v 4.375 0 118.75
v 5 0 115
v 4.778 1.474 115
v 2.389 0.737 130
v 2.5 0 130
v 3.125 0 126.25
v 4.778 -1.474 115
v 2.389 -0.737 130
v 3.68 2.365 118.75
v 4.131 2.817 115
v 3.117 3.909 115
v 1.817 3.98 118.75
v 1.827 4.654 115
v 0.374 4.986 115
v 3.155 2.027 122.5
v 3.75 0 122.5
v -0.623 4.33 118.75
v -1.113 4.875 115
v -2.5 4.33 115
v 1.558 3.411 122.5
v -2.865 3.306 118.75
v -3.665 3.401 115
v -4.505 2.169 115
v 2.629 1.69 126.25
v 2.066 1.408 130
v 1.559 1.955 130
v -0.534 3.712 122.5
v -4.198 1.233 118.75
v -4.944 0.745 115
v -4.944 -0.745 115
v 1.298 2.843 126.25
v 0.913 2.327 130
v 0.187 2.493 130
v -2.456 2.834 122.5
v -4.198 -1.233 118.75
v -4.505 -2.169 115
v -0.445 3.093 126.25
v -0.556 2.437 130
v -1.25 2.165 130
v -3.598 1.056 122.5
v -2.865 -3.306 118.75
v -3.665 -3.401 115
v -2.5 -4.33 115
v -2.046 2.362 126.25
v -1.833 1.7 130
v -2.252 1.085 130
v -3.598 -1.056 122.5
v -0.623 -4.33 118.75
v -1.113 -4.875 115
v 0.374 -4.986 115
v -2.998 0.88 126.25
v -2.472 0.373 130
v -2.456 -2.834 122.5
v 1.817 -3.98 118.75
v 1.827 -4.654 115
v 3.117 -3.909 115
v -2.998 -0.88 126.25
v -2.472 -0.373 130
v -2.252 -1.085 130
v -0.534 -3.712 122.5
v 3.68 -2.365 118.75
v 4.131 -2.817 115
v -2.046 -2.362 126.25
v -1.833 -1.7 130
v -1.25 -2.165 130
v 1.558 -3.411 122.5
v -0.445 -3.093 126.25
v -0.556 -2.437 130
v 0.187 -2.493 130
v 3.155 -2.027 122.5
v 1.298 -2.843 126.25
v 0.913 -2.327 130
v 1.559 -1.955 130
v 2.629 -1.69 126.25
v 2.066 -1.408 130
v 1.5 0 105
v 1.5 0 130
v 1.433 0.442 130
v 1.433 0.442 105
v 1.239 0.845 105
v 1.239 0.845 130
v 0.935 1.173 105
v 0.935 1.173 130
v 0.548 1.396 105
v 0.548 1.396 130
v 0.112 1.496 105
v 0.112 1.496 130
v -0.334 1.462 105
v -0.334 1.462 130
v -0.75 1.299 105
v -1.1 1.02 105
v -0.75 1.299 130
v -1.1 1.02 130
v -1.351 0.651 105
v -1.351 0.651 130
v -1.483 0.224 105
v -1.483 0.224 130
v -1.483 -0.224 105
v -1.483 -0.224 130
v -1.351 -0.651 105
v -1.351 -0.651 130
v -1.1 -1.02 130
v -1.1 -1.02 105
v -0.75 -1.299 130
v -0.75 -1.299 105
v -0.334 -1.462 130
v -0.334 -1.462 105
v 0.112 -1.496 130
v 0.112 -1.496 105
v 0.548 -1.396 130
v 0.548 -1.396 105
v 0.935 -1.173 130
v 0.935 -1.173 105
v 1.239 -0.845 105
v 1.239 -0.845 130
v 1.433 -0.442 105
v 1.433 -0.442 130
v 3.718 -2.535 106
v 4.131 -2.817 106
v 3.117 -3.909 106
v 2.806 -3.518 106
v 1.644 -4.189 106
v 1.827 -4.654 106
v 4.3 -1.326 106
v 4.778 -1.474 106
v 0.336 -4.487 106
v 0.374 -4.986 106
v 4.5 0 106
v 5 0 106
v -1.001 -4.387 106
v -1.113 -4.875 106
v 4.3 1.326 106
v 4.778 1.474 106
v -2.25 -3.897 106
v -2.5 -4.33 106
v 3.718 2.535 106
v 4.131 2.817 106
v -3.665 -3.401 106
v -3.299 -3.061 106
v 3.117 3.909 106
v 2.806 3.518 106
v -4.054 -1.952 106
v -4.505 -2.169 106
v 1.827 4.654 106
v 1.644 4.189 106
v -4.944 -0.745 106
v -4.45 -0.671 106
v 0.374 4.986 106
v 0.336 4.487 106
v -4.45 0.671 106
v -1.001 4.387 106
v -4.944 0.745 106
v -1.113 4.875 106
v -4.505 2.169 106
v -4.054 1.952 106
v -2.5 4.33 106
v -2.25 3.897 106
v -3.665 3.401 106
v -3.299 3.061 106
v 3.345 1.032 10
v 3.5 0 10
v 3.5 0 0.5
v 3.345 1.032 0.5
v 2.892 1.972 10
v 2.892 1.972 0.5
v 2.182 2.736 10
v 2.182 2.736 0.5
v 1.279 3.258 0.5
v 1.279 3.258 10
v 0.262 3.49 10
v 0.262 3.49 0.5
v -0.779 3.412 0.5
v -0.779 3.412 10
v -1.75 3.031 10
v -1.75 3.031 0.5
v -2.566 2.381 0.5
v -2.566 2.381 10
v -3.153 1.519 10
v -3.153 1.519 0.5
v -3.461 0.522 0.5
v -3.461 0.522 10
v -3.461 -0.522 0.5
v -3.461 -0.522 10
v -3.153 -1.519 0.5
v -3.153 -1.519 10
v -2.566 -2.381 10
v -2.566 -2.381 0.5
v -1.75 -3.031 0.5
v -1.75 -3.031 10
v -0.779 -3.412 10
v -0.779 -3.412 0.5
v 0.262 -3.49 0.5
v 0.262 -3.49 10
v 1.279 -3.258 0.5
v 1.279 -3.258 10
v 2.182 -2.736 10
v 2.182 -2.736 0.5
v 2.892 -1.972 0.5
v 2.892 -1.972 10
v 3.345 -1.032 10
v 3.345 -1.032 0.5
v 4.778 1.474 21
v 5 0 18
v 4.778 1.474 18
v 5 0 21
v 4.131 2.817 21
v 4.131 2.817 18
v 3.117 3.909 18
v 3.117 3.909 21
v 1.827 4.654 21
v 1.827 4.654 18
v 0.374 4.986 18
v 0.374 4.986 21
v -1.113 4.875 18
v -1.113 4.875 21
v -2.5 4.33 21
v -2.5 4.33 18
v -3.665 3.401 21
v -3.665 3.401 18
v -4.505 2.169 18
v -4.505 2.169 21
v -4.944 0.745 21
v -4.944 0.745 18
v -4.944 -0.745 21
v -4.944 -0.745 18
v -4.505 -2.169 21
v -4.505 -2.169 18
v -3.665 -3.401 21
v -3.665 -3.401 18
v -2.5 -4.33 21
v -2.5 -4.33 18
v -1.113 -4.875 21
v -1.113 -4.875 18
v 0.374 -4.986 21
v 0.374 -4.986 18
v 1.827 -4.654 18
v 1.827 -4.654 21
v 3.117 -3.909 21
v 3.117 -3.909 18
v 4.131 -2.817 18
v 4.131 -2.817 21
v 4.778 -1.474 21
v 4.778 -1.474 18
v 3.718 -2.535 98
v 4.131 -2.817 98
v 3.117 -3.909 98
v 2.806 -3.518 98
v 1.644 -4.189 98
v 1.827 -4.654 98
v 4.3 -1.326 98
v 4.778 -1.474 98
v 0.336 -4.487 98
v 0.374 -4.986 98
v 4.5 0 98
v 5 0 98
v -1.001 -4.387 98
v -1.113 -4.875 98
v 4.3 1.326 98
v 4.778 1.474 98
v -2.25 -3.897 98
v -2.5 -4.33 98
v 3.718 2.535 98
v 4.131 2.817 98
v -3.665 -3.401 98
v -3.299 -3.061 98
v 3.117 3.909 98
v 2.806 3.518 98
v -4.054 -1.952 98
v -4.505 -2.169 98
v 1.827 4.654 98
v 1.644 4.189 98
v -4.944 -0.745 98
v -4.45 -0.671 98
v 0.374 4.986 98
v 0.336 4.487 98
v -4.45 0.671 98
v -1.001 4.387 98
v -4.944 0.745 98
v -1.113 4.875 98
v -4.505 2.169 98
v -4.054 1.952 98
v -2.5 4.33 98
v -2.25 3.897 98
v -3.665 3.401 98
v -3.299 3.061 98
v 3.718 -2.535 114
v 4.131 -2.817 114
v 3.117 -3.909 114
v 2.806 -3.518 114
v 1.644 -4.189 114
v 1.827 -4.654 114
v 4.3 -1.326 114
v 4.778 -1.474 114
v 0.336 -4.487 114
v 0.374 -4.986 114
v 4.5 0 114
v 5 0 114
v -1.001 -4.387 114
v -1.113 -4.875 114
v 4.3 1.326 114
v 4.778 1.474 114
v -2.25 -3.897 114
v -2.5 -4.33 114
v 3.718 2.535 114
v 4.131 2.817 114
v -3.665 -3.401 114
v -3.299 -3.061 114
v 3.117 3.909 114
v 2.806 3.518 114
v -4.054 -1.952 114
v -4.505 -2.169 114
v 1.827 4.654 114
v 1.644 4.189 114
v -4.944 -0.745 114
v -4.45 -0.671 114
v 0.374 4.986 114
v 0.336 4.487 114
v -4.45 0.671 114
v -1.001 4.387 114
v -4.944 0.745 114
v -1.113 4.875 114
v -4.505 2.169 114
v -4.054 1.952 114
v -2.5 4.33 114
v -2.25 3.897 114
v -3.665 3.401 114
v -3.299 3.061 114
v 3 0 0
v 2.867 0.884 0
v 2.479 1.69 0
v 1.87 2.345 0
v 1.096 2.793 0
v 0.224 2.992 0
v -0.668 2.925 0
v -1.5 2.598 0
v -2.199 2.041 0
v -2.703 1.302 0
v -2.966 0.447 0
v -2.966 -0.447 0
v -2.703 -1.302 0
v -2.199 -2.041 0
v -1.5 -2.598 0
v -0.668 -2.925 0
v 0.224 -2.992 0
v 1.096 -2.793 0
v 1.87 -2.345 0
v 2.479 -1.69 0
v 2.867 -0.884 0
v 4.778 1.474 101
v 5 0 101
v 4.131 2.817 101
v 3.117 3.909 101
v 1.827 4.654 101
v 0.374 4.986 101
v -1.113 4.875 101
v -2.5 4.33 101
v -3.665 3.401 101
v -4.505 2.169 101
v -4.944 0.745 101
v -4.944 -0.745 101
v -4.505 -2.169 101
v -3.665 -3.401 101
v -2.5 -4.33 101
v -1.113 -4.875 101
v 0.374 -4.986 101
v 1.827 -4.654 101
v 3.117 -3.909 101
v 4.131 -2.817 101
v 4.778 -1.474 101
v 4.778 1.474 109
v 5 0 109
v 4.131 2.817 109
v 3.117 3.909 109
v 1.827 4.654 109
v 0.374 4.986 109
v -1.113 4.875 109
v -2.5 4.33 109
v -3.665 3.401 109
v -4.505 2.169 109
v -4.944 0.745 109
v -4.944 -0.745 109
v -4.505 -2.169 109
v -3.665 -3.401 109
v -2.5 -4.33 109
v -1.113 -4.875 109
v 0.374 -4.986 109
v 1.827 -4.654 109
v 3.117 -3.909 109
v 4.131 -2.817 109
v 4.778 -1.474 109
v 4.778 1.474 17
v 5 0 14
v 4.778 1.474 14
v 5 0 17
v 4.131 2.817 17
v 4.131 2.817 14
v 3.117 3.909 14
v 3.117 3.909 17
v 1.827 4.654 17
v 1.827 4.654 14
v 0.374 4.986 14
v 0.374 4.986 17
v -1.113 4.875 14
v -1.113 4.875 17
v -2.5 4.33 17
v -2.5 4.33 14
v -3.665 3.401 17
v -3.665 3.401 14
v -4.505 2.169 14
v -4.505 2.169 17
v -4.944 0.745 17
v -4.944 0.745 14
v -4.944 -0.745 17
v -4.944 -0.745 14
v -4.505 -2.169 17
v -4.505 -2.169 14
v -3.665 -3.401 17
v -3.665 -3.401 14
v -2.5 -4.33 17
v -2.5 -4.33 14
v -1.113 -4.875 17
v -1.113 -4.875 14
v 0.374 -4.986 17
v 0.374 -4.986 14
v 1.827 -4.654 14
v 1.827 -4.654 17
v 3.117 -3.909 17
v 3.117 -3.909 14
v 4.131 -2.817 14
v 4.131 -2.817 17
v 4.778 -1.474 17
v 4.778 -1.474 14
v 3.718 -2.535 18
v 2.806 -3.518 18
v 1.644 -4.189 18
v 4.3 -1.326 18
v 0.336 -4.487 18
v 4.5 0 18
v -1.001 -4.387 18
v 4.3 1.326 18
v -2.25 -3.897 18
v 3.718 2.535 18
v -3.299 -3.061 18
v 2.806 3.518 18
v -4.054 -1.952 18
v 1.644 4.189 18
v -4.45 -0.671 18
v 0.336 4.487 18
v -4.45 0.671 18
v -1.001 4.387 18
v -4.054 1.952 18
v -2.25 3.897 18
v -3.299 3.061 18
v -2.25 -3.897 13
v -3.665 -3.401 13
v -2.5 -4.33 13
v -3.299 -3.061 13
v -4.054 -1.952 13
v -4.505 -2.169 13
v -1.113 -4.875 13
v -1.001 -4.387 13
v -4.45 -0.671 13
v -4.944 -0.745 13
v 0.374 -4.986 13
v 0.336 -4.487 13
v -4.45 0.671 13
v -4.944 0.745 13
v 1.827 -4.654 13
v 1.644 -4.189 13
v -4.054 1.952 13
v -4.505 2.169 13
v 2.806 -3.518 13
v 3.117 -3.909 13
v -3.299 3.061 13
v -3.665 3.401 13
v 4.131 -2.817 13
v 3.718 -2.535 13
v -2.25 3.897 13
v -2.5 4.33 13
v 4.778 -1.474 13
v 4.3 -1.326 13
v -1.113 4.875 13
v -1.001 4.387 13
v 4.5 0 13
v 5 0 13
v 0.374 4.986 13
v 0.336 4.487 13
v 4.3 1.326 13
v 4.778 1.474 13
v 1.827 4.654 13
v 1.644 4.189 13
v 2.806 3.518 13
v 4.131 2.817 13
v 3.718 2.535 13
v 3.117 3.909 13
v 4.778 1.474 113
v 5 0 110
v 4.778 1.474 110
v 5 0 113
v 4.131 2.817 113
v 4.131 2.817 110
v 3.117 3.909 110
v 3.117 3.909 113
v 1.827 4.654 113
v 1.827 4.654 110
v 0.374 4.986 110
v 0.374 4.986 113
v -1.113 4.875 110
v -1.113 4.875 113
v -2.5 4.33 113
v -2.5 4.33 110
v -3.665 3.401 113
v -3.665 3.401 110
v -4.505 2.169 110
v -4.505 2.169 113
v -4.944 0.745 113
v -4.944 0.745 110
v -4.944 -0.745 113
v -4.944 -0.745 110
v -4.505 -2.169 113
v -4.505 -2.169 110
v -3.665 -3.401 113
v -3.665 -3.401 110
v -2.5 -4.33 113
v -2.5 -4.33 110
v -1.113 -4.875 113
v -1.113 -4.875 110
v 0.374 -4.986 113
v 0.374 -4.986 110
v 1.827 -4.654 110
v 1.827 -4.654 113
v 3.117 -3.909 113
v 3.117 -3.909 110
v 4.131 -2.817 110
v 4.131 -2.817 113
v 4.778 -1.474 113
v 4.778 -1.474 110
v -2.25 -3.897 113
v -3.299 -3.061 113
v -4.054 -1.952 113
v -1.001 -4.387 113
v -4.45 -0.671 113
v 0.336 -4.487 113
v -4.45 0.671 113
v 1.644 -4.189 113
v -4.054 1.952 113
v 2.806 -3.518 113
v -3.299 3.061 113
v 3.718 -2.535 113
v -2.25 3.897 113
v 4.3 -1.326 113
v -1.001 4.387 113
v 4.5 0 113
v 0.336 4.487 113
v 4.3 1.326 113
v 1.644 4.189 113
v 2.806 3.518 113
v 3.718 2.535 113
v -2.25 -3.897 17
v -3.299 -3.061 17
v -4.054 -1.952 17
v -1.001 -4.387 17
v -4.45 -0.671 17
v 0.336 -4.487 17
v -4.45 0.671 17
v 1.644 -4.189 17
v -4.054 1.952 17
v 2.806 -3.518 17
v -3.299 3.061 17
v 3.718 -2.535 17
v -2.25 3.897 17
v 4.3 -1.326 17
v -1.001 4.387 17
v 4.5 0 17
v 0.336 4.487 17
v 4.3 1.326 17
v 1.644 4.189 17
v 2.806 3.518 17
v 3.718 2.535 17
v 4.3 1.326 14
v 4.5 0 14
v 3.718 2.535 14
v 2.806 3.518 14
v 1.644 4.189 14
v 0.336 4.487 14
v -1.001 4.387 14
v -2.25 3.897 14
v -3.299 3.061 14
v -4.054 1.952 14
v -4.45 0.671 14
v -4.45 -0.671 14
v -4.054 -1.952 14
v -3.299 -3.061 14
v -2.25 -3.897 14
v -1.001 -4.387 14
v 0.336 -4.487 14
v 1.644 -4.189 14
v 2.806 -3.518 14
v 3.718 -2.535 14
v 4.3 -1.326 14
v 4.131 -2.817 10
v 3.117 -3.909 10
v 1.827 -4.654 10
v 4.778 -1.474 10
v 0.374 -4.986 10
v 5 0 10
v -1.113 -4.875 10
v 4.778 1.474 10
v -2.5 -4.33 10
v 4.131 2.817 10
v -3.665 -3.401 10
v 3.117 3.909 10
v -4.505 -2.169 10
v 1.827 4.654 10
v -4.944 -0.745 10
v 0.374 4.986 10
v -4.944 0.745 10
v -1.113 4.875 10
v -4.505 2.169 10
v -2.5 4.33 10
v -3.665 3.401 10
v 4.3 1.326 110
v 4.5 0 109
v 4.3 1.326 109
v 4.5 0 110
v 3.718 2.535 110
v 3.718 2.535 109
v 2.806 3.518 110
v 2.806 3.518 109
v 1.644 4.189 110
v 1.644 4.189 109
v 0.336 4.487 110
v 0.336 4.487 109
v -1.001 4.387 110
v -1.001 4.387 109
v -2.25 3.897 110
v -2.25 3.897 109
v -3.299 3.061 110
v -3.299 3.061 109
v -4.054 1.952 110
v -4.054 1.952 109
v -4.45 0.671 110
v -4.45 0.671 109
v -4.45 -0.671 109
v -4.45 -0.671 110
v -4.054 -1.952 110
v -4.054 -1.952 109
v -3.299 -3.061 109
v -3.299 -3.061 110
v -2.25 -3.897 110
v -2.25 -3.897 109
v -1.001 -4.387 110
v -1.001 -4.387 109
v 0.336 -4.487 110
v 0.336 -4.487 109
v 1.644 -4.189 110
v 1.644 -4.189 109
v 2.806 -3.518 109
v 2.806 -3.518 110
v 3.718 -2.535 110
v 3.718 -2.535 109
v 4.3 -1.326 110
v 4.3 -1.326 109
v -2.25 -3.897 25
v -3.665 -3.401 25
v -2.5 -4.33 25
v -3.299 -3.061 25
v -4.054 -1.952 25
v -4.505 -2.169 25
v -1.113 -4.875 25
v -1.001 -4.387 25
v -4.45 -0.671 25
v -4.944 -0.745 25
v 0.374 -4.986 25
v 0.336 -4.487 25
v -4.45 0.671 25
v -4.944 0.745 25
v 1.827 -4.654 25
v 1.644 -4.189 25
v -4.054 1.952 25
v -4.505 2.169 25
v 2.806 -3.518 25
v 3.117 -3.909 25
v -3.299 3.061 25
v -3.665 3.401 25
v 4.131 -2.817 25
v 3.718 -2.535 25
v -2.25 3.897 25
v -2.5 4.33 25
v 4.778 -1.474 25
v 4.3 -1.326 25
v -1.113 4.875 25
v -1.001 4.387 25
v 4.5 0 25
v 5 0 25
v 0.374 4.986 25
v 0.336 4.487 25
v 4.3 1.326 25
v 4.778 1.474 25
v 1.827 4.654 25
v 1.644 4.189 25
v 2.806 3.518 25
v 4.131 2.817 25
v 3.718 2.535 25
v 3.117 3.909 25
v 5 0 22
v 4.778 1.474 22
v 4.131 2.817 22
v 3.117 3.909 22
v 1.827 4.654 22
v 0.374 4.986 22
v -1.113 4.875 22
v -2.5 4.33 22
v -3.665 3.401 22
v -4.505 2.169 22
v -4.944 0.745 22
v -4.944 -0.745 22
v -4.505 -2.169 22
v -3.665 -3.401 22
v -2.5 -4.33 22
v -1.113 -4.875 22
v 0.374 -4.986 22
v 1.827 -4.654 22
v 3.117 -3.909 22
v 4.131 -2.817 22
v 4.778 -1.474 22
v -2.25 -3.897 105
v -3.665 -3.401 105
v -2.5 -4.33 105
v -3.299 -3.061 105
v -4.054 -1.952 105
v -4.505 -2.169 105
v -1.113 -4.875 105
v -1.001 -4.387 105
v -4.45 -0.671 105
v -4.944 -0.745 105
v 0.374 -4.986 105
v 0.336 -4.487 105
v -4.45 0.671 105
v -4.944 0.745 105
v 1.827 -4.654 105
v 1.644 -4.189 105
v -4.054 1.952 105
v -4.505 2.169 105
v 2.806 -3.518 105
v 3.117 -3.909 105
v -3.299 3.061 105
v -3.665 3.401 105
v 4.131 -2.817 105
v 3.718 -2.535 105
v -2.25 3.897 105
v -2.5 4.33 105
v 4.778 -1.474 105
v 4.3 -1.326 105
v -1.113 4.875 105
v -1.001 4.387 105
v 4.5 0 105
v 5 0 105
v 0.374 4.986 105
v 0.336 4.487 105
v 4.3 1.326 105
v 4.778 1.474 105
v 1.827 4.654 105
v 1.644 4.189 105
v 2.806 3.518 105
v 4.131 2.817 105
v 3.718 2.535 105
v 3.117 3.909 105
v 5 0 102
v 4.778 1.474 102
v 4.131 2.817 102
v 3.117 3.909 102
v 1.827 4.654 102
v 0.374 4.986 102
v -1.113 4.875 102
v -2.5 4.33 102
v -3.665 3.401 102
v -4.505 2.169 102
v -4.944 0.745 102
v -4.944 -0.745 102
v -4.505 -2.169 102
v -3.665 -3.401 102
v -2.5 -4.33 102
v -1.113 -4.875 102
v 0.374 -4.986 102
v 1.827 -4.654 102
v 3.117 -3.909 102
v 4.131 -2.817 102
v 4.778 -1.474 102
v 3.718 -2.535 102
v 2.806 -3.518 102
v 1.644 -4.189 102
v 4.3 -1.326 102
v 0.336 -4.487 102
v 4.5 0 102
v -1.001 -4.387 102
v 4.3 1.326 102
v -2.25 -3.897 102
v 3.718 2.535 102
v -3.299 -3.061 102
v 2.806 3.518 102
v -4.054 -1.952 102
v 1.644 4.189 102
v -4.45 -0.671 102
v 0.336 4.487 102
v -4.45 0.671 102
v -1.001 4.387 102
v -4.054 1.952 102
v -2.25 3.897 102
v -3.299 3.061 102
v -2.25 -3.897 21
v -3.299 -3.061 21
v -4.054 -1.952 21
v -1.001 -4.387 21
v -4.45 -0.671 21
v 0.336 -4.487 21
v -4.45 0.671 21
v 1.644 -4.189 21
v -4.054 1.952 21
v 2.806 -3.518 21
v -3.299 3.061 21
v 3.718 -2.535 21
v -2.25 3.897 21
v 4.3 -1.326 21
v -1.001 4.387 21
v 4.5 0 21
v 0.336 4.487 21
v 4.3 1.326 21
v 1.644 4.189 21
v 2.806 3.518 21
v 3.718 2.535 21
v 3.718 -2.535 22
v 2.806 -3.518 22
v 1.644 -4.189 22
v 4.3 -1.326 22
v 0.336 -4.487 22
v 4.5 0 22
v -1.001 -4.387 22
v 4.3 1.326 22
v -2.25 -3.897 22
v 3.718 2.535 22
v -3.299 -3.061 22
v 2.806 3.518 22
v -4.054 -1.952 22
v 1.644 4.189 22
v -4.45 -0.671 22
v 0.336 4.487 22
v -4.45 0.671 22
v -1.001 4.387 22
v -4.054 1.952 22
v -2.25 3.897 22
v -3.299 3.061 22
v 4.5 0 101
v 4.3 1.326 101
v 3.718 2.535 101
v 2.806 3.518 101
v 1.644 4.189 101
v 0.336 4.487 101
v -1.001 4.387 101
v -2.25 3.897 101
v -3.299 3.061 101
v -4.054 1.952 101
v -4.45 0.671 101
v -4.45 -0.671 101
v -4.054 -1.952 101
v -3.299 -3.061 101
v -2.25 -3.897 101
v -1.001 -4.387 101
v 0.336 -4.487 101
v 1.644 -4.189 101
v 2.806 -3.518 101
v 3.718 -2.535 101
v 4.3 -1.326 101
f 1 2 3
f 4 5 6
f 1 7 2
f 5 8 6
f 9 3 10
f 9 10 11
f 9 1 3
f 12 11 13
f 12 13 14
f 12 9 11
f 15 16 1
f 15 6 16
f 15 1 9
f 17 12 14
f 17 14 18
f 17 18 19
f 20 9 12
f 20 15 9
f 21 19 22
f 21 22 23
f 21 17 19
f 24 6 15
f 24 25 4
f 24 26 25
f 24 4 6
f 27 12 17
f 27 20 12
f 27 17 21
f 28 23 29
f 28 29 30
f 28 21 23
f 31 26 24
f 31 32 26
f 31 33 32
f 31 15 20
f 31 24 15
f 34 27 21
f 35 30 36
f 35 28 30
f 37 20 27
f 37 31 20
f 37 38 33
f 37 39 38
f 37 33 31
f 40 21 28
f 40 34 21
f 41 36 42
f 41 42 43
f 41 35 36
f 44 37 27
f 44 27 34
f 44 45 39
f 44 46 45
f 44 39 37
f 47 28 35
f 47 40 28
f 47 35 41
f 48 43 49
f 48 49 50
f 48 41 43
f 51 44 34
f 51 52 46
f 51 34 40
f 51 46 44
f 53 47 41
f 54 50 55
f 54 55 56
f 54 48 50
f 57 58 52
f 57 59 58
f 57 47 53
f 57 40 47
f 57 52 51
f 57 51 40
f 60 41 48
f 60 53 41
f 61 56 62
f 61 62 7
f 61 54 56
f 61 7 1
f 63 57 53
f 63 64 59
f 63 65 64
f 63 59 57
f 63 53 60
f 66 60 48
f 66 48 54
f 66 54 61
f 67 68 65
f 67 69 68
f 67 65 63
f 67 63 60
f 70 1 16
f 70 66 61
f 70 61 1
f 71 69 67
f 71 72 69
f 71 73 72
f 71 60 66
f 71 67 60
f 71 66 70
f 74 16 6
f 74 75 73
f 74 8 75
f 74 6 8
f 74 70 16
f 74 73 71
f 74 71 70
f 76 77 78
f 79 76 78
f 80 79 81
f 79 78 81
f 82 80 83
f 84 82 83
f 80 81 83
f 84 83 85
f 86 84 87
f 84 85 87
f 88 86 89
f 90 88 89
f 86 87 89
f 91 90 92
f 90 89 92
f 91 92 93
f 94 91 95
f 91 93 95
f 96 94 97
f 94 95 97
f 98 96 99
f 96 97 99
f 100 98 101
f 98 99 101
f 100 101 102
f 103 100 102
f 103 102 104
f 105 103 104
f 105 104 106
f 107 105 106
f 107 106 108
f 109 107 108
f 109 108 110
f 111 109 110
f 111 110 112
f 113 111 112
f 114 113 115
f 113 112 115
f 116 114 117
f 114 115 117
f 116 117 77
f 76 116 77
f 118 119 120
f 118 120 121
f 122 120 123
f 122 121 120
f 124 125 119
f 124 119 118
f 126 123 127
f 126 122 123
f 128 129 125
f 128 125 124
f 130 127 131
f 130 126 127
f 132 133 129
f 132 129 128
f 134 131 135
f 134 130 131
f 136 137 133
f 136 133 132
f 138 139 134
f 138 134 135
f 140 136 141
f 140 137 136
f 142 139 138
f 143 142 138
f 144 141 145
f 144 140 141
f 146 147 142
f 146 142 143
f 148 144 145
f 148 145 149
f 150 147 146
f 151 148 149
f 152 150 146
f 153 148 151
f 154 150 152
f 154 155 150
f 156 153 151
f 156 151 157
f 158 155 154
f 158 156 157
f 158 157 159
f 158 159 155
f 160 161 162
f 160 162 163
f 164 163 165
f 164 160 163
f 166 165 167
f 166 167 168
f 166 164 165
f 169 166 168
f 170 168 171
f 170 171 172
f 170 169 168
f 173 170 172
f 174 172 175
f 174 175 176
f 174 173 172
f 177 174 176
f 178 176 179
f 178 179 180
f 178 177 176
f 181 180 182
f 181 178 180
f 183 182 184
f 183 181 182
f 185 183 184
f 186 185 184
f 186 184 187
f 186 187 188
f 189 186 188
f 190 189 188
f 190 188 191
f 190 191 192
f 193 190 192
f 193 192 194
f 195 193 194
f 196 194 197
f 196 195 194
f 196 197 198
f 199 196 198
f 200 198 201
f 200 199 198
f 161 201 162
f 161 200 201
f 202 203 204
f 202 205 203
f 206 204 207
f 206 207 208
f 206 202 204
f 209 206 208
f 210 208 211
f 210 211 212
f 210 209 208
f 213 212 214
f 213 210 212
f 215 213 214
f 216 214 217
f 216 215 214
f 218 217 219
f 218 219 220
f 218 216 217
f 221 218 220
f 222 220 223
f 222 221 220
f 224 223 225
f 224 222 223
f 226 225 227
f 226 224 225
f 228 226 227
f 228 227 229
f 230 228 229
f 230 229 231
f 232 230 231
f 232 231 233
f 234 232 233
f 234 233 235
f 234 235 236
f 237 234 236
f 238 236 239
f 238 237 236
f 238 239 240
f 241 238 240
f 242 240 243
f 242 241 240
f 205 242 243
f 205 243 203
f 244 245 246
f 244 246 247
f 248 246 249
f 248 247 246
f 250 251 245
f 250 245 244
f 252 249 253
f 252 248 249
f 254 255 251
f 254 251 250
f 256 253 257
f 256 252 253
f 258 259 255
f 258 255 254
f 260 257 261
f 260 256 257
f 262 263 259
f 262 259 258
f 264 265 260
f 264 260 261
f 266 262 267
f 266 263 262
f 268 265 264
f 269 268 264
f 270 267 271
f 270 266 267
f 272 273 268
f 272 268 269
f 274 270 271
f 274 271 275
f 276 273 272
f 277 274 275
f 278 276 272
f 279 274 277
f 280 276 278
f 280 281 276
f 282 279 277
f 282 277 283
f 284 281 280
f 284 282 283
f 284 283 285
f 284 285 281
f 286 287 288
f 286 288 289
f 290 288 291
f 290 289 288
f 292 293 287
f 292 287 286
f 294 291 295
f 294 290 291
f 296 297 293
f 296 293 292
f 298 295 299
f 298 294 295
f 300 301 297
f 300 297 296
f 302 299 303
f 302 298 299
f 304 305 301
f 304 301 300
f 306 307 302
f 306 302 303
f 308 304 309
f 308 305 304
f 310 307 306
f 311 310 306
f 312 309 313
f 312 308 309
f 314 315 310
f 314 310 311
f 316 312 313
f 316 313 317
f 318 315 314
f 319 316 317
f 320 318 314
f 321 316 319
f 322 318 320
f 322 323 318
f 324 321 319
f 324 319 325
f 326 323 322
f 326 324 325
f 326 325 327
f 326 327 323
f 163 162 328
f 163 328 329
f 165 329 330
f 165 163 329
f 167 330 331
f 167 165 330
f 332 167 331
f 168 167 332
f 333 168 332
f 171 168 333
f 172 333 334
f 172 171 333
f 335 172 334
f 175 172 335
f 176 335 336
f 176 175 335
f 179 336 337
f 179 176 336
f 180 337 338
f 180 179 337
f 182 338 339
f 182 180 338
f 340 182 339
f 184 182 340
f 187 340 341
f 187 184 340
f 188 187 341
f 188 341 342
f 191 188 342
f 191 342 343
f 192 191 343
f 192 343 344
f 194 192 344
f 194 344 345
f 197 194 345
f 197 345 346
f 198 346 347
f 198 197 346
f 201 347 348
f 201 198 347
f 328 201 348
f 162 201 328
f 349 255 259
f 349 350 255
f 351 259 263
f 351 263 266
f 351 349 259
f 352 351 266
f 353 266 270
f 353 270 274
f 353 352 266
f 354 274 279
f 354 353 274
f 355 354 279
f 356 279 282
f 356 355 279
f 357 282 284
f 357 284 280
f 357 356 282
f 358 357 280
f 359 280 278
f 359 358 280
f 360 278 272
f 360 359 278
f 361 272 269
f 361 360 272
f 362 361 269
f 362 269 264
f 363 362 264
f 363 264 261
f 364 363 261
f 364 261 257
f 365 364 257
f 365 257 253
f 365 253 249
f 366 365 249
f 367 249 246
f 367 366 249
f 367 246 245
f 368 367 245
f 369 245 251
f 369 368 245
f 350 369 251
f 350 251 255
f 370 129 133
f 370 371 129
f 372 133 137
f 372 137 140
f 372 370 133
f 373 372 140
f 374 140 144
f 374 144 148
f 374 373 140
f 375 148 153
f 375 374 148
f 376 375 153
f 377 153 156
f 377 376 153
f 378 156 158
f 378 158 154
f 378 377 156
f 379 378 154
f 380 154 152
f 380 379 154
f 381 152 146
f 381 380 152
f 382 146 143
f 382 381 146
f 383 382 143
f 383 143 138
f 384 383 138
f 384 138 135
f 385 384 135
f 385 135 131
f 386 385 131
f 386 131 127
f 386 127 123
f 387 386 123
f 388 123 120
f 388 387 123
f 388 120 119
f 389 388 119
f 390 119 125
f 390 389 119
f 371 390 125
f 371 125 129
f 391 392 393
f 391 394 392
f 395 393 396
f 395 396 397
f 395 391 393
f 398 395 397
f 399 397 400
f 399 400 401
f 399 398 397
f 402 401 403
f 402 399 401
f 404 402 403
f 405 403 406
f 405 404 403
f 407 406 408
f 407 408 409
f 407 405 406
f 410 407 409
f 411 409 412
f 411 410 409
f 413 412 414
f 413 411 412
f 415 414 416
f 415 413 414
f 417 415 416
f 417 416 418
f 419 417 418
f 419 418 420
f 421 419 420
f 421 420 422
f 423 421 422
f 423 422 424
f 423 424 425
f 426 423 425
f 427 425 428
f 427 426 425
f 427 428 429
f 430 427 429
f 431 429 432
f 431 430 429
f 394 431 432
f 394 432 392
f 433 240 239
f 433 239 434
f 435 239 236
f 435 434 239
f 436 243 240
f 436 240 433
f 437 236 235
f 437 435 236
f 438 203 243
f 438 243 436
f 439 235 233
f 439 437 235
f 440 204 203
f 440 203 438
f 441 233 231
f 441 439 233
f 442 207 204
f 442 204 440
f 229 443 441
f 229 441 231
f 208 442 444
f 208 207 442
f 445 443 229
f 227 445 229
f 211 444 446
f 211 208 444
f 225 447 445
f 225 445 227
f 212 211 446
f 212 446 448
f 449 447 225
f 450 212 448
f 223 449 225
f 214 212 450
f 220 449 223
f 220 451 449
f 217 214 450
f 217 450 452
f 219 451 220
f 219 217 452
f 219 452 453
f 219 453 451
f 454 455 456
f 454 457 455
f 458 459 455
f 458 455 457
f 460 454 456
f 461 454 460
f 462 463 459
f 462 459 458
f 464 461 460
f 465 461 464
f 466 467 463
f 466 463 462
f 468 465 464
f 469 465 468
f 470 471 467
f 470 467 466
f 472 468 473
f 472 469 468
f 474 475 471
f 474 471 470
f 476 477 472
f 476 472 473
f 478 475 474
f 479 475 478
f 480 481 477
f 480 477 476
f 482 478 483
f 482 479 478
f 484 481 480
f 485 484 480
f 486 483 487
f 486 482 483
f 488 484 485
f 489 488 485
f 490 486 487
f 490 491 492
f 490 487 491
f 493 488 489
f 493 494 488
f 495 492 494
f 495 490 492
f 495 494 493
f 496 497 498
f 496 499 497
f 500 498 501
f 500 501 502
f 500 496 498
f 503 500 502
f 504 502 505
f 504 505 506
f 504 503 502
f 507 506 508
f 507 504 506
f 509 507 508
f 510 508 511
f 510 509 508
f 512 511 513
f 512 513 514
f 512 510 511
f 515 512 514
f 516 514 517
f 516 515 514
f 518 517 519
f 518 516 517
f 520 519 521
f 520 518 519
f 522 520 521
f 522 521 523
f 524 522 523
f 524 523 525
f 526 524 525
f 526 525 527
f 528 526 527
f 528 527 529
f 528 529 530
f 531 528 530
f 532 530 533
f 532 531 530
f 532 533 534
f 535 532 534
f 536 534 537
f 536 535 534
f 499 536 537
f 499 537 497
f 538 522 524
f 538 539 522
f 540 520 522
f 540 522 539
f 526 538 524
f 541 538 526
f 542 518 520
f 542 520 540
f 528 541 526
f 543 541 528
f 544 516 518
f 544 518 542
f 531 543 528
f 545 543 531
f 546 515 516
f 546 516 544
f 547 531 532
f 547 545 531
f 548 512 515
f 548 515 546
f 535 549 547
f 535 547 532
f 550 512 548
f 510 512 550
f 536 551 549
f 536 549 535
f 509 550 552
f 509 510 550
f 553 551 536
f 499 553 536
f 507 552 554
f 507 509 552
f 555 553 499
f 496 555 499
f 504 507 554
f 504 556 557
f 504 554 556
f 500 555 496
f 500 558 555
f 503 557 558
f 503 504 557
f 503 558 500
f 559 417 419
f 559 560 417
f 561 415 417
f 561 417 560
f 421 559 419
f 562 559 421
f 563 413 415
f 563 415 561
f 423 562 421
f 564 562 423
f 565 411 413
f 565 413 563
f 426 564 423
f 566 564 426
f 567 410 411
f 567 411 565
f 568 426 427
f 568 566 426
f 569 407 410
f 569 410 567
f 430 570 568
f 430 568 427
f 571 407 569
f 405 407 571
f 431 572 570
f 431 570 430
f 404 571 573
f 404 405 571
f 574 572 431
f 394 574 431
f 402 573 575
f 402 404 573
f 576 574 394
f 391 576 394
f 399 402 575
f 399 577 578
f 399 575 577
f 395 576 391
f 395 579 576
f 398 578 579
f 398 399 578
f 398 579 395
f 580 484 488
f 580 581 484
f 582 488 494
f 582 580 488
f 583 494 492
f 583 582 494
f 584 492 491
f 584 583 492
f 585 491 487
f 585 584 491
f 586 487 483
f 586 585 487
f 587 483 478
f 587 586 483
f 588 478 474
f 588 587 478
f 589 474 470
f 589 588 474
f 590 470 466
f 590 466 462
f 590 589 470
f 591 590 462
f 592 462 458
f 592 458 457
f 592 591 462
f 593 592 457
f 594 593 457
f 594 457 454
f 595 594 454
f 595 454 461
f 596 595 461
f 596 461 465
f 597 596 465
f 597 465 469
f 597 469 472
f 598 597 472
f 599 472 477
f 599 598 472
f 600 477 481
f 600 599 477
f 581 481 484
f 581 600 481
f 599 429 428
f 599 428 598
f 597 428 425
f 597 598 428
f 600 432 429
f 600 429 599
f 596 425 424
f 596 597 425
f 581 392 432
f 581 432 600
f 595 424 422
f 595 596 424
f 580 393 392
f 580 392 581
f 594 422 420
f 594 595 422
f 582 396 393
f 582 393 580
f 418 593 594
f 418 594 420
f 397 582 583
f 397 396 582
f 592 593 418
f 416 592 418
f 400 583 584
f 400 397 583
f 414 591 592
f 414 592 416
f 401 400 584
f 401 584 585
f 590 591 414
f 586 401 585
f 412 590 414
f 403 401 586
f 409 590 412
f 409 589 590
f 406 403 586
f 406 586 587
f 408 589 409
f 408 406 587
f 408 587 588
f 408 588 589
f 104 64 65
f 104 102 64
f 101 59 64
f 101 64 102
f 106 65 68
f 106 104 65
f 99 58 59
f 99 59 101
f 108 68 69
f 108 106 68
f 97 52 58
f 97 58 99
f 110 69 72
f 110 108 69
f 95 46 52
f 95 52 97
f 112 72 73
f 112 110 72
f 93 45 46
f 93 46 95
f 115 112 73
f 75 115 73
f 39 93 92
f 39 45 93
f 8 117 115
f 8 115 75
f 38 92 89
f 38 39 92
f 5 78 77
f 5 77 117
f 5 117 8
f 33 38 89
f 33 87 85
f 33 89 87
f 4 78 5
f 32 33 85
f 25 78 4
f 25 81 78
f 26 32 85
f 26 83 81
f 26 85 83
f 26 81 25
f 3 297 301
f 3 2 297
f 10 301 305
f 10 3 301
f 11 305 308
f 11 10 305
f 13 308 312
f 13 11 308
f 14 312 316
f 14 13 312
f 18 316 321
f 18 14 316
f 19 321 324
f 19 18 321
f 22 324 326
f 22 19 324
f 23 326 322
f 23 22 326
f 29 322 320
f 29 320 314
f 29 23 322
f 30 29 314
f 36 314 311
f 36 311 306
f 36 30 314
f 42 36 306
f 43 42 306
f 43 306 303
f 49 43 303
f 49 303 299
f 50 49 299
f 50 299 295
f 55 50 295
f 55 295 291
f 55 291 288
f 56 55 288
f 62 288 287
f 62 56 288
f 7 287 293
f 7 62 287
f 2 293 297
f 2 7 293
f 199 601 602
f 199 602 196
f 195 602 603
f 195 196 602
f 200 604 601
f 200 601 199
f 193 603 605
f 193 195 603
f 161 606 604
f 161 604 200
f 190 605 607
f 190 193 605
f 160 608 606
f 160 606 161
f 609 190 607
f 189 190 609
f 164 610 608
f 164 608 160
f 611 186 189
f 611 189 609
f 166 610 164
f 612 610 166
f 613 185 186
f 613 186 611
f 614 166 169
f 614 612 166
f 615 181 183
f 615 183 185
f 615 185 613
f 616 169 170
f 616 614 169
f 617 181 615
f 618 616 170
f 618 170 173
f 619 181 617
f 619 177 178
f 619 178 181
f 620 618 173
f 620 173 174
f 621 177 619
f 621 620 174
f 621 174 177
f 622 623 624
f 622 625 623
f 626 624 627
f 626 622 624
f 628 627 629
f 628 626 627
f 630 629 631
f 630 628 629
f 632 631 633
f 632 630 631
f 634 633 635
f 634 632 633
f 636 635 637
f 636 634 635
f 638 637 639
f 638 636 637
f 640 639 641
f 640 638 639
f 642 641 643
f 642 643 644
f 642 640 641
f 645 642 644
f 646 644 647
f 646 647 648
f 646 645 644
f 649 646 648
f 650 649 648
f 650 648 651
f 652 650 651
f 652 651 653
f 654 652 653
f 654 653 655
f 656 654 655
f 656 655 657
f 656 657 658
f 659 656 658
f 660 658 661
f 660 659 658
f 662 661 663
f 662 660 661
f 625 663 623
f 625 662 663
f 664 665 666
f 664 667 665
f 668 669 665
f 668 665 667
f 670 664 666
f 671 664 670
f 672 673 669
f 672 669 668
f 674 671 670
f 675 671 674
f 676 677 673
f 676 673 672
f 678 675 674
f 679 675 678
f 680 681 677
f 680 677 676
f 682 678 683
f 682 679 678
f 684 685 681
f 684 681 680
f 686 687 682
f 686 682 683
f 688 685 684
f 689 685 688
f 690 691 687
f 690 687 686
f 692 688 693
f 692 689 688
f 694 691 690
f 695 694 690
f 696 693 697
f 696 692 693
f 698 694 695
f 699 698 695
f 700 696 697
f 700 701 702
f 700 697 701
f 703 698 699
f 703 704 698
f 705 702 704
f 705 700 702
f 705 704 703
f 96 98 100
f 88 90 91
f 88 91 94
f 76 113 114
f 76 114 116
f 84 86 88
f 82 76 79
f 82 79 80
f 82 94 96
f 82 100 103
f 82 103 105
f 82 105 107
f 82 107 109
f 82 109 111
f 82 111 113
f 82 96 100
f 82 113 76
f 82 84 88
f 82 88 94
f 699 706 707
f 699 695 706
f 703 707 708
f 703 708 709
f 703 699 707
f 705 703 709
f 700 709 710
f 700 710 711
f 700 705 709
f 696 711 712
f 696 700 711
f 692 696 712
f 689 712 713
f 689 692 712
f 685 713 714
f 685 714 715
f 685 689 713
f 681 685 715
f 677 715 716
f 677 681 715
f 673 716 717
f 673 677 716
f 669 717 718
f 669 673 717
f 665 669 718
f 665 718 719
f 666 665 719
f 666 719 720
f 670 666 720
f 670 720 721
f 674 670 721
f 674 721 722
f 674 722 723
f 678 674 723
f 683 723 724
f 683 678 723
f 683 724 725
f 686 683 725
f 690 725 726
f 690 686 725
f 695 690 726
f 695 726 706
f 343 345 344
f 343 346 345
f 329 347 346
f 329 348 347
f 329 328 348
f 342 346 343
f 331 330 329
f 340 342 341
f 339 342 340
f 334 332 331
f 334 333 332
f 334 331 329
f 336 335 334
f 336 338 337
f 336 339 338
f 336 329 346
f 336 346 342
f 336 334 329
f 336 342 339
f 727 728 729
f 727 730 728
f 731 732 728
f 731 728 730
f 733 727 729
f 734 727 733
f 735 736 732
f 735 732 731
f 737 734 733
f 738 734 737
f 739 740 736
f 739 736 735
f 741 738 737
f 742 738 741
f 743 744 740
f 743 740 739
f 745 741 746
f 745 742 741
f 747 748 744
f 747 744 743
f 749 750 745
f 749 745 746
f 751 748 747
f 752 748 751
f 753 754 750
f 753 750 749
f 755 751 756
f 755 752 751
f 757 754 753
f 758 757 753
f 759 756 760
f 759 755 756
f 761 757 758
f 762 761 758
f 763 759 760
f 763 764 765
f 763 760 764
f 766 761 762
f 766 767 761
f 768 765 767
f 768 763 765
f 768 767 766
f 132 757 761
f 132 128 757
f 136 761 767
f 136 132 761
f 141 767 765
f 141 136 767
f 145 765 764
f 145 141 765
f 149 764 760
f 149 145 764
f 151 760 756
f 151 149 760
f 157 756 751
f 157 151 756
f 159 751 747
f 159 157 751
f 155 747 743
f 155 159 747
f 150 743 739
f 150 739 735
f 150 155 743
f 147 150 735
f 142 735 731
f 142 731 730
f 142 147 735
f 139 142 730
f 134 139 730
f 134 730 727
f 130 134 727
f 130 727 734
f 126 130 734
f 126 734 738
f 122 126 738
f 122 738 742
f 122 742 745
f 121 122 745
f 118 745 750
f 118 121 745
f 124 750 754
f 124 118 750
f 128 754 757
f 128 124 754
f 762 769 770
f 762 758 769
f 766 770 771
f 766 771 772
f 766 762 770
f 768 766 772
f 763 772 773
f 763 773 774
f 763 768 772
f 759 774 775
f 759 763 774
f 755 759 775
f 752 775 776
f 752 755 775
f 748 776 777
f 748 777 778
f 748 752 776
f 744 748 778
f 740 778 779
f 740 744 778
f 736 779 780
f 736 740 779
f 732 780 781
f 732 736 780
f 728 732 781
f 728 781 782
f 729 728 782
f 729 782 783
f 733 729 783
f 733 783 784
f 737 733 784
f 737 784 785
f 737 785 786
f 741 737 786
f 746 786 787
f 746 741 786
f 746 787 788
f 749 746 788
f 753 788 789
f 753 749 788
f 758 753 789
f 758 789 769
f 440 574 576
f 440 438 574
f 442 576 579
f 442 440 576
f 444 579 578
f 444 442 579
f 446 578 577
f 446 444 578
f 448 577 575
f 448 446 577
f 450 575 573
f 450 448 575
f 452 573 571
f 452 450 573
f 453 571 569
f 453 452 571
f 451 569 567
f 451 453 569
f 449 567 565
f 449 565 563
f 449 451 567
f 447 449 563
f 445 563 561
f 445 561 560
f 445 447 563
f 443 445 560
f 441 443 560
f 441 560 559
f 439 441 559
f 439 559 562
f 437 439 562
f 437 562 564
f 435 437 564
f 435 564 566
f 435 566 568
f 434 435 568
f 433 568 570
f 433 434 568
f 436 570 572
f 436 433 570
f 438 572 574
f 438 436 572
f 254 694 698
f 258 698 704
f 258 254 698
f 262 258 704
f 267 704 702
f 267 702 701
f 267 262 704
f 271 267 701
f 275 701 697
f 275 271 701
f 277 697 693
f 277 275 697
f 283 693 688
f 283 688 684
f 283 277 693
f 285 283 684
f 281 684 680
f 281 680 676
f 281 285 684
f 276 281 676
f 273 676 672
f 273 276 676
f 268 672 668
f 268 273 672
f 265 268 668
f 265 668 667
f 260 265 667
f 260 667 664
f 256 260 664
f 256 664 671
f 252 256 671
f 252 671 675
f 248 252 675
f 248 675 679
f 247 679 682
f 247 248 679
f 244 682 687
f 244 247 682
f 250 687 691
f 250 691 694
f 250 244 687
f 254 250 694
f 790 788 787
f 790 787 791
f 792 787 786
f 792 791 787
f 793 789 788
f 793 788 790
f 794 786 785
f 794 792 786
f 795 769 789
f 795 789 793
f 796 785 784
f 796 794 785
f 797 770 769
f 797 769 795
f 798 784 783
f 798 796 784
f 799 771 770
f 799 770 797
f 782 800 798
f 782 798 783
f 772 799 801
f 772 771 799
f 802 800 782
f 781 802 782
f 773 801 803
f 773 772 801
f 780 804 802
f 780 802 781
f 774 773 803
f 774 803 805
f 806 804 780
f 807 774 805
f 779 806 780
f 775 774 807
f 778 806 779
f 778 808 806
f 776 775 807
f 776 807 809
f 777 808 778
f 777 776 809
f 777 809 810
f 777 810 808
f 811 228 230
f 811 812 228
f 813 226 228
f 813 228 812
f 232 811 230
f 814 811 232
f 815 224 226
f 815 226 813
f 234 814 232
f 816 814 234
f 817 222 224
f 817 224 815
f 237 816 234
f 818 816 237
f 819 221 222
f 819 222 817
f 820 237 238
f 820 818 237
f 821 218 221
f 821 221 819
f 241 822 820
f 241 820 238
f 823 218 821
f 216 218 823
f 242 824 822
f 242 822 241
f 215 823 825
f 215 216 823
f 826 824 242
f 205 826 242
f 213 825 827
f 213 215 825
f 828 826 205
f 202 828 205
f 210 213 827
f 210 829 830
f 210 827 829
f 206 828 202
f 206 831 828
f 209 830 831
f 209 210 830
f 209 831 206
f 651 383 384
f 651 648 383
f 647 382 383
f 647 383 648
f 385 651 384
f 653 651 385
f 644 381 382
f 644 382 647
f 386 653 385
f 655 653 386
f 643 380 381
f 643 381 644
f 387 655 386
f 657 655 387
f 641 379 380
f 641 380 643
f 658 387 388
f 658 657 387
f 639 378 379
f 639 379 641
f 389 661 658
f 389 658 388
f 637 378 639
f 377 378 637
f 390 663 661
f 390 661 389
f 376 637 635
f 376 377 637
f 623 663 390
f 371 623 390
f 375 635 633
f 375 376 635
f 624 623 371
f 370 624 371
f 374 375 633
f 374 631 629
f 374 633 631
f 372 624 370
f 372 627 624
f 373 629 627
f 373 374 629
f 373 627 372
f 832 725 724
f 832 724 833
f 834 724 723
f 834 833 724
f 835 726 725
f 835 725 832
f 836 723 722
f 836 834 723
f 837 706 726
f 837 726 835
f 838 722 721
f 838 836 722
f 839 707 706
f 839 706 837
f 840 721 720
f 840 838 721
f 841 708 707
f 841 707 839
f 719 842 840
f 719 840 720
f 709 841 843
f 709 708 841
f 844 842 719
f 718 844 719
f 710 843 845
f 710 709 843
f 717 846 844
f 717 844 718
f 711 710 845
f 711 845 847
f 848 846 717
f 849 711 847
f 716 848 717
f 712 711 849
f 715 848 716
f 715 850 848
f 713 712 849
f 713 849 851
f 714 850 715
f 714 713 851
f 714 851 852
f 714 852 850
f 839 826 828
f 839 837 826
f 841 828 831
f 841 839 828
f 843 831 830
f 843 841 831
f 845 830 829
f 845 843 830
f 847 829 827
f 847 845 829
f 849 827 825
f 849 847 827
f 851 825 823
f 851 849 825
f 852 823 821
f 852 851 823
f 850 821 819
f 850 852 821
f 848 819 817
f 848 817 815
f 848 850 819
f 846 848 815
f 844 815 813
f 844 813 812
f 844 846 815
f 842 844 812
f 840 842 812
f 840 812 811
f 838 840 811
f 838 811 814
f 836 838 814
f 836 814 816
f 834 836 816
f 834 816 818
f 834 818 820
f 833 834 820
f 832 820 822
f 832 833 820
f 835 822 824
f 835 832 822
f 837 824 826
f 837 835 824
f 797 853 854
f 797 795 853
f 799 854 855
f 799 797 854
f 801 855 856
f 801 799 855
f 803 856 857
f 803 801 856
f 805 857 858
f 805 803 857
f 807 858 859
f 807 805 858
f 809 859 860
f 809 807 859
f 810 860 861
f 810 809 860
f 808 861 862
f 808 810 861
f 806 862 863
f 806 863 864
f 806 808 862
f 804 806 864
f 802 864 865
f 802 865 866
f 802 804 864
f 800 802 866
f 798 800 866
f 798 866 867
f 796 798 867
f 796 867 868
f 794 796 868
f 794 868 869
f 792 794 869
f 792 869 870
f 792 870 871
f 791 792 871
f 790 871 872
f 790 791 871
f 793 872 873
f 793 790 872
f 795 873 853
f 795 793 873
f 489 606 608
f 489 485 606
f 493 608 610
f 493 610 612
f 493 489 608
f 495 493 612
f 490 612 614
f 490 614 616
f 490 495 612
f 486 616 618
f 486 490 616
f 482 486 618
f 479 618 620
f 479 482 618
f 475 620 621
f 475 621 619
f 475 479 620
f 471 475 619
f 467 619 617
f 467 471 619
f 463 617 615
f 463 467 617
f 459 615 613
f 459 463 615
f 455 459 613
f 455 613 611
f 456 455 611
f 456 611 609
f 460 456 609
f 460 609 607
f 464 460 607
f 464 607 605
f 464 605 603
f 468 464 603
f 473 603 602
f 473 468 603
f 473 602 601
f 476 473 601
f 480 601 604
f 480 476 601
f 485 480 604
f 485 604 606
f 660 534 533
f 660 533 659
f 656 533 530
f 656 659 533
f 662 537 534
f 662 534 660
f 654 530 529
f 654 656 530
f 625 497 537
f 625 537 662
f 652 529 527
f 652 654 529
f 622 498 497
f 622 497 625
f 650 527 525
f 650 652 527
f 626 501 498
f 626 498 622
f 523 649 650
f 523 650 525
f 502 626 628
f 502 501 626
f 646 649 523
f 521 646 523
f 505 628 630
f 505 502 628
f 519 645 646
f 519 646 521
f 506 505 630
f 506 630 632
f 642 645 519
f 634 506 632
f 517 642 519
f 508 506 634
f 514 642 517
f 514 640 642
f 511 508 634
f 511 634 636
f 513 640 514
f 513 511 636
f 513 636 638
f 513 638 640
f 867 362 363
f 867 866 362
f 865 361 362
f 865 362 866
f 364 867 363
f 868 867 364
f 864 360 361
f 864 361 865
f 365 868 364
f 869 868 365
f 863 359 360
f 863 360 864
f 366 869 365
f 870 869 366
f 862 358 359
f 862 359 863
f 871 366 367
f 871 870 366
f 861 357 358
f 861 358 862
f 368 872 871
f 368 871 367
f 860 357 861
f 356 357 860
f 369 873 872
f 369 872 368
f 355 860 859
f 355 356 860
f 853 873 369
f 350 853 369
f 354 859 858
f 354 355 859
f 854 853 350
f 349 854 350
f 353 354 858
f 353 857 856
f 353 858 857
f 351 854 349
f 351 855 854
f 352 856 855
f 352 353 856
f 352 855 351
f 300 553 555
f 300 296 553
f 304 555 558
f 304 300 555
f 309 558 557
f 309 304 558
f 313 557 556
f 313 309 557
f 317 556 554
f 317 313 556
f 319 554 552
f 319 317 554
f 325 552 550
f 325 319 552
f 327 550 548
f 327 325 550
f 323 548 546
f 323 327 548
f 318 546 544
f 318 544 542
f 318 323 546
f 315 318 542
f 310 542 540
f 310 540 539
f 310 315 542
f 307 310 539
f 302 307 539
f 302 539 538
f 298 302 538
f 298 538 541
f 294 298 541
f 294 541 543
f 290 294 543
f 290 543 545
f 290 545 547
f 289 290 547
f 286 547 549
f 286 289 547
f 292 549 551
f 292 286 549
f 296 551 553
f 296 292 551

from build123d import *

# Parameters (mm, degrees)
F2_R     = 1.5
F3_DEPTH = 25
F4_SIZE  = 0.5


with BuildPart() as f1:
    # F0 (on Front) → F1 (revolve)
    with BuildSketch(Plane.XZ):
        Polygon((0, 130), (0, 0), (3.5, 0), (3.5, 10), (5, 10), (5, 13), (4.5, 13), (4.5, 14), (5, 14), (5, 17), (4.5, 17), (4.5, 18), (5, 18), (5, 21), (4.5, 21), (4.5, 22), (5, 22), (5, 25), (4.5, 25), (4.5, 98), (5, 98), (5, 101), (4.5, 101), (4.5, 102), (5, 102), (5, 105), (4.5, 105), (4.5, 106), (5, 106), (5, 109), (4.5, 109), (4.5, 110), (5, 110), (5, 113), (4.5, 113), (4.5, 114), (5, 114), (5, 115), (2.5, 130), align=None)
    revolve(axis=Axis((0, 0, 65), (0, 0, 1)))

    # F2 (on face) → F3 (cut)
    with BuildSketch(Plane.XY.offset(130)):
        Circle(F2_R)
    extrude(amount=-F3_DEPTH, mode=Mode.SUBTRACT)

    # F4
    f4_edges = [f1.edges().sort_by_distance(p)[0] for p in [
        (-3.5, 0, 0),
    ]]
    chamfer(f4_edges, length=F4_SIZE)


solid = f1.part
